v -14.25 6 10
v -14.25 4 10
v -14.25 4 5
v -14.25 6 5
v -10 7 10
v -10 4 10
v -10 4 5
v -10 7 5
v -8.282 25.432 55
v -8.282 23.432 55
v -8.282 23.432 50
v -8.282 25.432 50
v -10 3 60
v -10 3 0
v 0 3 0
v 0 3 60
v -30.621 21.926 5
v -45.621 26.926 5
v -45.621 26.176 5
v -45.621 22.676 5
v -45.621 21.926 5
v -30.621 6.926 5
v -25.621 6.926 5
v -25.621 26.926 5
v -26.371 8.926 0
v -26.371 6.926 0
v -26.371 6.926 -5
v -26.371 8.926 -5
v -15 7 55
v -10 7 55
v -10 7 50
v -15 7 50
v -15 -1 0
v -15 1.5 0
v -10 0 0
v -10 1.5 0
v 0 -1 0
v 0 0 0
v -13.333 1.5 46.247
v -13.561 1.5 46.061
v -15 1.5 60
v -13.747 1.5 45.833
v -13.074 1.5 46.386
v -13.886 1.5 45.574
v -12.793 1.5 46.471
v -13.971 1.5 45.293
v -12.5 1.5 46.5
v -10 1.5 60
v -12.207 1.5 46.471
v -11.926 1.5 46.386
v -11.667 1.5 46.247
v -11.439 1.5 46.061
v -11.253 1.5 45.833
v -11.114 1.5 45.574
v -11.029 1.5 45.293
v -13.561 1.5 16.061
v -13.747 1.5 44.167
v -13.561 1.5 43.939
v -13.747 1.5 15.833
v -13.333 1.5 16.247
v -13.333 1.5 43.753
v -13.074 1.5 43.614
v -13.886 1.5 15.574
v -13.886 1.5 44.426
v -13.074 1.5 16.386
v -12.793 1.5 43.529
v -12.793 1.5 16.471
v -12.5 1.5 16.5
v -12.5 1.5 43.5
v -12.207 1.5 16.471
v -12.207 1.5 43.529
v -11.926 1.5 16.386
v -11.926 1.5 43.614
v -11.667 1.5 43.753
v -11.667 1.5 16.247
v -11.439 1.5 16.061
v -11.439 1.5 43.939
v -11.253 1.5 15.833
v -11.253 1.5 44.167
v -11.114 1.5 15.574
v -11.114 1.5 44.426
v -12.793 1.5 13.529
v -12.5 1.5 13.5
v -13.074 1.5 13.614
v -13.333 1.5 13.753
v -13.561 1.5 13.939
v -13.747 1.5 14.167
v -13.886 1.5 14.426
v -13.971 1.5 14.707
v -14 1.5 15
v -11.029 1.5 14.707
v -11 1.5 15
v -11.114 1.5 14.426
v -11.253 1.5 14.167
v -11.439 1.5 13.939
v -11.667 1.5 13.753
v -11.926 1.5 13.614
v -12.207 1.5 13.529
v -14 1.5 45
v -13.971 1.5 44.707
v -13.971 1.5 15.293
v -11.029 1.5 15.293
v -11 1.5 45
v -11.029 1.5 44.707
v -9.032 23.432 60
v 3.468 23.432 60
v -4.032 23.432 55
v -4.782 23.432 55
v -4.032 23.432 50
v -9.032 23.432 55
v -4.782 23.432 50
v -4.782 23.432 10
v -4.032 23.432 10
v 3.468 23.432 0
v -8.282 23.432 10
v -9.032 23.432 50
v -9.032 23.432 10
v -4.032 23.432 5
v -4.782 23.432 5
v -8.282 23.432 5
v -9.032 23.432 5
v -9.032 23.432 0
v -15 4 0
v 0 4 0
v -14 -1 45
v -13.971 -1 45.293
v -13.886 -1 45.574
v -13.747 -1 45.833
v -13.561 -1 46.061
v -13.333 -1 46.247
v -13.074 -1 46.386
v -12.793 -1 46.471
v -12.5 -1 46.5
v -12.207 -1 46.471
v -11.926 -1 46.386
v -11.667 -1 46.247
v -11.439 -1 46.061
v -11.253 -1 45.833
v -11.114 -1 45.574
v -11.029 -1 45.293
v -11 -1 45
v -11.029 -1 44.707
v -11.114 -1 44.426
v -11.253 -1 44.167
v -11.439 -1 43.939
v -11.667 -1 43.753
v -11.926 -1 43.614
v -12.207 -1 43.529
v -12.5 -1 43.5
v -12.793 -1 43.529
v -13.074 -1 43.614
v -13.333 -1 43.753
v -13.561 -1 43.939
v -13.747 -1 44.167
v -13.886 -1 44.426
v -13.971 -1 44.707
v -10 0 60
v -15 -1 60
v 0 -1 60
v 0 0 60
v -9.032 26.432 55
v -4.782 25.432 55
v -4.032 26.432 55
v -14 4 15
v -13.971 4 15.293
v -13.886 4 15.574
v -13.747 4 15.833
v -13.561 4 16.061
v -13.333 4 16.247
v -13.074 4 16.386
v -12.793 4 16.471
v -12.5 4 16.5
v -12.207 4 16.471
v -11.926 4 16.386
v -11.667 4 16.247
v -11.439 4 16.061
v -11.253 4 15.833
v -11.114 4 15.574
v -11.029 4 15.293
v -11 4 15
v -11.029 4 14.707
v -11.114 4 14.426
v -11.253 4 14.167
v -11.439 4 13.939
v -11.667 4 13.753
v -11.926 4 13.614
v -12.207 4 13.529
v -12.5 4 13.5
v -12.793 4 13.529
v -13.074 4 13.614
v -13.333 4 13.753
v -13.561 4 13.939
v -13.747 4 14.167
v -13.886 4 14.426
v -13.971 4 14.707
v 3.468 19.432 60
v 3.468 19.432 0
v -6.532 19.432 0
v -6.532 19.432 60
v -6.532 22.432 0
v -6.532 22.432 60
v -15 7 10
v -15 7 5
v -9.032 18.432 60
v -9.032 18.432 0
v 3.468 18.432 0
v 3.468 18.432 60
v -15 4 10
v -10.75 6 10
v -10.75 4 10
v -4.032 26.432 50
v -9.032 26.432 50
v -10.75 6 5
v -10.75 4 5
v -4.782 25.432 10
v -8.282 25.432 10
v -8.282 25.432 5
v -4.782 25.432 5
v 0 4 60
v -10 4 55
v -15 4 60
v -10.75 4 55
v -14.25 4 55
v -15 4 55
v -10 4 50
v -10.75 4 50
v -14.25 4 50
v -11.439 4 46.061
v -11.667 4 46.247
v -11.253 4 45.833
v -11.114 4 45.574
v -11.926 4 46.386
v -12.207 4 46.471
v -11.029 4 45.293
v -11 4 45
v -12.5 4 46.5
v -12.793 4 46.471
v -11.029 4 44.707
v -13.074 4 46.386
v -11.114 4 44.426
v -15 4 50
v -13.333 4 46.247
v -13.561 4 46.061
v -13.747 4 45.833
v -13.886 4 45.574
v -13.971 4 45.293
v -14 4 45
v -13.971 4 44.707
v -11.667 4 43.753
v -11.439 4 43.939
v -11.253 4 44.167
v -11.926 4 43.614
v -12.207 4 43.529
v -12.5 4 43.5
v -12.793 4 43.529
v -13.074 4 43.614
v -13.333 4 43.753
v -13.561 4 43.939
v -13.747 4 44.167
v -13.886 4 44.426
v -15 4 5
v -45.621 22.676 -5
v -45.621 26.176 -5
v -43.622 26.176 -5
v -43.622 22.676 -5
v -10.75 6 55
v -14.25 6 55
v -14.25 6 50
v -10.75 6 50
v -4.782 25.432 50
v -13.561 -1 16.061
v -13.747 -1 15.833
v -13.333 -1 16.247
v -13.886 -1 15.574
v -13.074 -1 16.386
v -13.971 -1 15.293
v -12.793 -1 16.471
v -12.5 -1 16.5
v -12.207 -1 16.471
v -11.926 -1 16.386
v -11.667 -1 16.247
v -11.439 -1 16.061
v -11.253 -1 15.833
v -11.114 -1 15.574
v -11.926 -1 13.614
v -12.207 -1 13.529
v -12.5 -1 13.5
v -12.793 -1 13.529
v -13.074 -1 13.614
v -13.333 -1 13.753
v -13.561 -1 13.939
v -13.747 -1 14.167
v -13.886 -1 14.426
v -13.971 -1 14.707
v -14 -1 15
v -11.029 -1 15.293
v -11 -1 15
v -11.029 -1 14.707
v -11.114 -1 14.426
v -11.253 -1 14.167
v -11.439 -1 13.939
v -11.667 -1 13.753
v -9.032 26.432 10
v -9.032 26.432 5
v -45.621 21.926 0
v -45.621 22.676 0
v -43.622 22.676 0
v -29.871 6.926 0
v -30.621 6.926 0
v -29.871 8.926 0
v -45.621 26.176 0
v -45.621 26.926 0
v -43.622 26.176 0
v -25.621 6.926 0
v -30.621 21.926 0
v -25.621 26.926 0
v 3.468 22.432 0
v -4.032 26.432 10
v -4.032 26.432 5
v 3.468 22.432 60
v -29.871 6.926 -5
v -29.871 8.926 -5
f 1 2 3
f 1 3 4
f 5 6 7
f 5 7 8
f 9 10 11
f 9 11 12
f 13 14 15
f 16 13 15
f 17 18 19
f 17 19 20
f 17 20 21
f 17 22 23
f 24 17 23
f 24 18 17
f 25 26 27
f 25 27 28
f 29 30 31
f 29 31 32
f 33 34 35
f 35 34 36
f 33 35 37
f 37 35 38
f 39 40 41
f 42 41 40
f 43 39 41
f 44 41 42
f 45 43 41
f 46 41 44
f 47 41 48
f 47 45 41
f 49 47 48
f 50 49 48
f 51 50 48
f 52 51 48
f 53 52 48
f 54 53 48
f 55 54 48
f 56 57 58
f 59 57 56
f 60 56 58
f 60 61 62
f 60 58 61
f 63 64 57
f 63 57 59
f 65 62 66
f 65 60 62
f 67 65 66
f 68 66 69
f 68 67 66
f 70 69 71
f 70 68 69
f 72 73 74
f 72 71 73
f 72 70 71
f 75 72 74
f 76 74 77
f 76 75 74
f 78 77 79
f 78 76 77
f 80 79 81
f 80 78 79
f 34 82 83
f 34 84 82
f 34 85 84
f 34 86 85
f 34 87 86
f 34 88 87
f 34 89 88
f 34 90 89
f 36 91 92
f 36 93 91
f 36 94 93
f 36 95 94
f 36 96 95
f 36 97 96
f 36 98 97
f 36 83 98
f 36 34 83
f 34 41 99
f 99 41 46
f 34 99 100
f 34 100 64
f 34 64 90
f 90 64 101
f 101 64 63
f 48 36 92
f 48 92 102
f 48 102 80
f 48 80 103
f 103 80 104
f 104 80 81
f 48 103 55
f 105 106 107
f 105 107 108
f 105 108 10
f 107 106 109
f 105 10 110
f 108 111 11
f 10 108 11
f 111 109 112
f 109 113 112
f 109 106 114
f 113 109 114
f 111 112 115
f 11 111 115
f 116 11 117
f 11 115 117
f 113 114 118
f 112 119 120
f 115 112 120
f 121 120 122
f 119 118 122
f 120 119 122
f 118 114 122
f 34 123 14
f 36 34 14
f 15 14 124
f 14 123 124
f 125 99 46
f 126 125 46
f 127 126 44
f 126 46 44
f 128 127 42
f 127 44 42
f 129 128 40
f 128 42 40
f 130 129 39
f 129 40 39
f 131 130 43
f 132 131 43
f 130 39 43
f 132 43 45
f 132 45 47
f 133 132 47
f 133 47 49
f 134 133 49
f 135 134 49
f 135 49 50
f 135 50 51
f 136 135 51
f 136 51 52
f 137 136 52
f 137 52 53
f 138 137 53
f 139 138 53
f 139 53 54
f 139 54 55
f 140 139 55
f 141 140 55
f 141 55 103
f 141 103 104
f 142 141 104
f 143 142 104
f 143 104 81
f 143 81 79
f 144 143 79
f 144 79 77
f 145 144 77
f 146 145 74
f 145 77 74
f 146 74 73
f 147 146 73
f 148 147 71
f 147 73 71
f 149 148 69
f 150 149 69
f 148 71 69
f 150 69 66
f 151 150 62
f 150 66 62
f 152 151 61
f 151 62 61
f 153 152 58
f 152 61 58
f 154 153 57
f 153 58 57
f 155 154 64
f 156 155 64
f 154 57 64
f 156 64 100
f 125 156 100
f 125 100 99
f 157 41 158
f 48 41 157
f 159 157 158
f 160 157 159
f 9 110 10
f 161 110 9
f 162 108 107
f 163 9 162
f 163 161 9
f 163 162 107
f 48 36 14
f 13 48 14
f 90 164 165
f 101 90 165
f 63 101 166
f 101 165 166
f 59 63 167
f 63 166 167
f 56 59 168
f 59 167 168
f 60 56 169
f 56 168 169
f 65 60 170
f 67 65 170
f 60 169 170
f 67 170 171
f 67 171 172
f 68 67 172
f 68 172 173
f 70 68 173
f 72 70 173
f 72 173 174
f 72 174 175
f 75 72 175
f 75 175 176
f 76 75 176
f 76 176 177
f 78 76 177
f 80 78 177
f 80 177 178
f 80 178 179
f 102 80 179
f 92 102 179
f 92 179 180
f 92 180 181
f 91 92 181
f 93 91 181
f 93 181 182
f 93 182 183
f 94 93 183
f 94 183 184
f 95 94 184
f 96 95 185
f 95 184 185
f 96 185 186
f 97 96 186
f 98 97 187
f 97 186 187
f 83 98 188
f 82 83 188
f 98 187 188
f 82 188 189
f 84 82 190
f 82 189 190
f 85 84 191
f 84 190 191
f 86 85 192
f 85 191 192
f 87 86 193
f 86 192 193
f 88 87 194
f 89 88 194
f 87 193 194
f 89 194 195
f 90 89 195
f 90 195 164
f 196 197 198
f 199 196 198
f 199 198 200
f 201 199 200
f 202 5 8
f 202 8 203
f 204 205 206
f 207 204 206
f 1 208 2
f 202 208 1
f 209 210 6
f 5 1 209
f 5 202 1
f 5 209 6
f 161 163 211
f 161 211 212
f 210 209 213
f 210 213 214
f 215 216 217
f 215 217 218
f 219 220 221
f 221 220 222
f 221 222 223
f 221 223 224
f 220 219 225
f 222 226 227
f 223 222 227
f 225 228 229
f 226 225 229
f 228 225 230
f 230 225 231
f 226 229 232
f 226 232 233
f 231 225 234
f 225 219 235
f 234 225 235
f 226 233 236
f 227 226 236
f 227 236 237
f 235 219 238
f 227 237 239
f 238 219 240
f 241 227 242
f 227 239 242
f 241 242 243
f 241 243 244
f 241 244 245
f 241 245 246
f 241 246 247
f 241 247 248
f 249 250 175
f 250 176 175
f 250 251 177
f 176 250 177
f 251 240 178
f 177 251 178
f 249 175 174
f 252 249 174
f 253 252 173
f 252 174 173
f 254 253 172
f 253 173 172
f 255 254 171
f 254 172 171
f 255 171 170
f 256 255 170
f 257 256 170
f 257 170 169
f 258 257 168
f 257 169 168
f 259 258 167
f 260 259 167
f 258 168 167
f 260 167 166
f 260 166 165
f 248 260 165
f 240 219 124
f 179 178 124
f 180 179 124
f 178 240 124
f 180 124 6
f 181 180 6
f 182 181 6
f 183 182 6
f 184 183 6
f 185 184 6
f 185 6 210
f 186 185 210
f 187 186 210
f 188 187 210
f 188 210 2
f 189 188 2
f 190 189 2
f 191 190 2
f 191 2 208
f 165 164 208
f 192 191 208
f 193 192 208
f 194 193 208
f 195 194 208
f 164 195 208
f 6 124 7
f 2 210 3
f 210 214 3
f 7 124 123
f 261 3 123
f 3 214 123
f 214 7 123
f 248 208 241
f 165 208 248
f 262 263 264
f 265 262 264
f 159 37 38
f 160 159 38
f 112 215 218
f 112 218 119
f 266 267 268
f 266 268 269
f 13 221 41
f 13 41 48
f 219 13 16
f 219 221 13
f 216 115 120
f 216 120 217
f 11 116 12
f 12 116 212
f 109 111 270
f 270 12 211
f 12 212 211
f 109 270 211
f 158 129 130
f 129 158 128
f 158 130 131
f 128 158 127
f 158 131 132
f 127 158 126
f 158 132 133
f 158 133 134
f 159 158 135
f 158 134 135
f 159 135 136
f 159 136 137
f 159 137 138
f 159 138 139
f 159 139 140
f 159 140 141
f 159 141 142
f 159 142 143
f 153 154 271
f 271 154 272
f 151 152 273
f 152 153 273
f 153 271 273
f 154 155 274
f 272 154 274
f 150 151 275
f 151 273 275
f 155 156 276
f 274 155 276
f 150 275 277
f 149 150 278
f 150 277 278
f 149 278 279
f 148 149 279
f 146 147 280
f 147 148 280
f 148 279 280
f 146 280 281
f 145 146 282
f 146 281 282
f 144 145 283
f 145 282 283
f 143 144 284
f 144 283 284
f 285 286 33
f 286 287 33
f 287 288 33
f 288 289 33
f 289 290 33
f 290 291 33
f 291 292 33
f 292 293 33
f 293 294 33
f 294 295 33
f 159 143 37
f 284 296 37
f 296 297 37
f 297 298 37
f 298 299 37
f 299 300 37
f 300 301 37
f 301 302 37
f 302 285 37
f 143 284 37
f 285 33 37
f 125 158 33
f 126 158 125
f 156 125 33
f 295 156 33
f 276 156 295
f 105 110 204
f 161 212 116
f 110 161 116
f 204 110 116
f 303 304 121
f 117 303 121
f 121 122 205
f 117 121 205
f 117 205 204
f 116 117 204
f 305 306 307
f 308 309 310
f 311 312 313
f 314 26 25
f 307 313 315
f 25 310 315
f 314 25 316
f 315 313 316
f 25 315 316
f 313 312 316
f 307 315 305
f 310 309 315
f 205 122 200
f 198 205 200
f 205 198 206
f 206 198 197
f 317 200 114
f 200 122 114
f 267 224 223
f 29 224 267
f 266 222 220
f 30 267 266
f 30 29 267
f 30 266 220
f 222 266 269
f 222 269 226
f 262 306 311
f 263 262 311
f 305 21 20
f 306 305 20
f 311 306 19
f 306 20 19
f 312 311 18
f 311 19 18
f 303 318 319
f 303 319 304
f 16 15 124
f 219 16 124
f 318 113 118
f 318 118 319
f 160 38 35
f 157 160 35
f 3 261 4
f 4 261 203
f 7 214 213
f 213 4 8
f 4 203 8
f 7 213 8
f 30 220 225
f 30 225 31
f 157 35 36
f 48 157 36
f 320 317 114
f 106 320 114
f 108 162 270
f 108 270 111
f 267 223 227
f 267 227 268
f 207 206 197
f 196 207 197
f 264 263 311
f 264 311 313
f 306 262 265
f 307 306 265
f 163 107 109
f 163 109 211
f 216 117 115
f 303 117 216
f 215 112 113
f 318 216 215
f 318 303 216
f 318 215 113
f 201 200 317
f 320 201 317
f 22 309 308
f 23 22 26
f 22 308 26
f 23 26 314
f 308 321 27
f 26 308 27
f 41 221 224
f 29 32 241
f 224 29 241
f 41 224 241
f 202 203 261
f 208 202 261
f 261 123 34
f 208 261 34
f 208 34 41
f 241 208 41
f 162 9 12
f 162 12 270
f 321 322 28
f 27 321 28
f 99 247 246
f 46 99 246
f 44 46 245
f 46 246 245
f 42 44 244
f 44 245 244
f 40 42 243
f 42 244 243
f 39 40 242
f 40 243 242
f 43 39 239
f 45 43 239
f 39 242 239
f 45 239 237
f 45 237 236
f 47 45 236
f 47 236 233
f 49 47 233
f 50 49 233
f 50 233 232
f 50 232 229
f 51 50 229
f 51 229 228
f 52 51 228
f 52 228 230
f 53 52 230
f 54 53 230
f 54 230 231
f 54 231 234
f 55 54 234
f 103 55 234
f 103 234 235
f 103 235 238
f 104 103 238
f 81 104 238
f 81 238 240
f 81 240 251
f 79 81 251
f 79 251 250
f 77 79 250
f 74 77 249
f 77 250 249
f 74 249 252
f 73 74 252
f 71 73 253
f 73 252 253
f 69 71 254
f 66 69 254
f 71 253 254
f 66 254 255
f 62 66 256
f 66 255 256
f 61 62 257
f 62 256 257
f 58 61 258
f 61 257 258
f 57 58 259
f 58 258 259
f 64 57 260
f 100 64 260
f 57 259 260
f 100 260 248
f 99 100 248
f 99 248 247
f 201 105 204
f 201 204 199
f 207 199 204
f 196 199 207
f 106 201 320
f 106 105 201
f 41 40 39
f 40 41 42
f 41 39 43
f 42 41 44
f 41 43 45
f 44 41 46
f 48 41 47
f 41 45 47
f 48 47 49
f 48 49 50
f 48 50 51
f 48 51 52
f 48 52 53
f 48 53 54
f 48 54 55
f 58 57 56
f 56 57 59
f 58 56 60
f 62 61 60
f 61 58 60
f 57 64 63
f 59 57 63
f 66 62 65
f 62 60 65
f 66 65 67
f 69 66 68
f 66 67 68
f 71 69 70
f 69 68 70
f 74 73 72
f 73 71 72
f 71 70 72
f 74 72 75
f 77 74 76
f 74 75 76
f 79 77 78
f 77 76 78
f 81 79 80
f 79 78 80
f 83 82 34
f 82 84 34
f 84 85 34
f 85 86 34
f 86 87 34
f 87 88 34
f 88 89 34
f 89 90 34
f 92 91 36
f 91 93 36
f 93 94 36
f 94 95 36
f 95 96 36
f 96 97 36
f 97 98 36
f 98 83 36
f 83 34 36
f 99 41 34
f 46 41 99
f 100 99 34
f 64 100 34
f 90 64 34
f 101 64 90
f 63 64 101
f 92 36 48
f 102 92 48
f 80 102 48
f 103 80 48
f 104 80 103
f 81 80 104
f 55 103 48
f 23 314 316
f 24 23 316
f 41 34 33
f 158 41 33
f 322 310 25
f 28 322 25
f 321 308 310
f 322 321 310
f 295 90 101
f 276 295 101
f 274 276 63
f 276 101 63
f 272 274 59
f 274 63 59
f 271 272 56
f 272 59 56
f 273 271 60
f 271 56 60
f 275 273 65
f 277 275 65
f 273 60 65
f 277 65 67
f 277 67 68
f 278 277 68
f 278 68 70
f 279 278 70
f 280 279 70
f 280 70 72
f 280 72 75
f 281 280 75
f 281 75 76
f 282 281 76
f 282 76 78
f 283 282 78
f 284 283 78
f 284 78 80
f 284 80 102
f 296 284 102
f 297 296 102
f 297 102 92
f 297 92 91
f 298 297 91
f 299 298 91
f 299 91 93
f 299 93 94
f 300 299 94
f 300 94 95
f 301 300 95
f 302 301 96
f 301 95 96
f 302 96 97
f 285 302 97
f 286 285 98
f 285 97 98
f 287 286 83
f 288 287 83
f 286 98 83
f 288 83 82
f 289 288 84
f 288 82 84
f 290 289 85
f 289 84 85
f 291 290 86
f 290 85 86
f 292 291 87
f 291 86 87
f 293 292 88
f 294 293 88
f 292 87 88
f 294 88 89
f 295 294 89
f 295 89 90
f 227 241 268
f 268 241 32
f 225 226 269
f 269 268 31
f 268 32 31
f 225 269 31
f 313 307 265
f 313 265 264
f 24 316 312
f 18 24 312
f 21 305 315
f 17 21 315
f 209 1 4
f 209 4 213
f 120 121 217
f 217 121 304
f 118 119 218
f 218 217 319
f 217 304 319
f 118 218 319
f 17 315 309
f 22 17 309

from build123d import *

# Parameters (mm, degrees)
F0_W       = 5
F0_H       = 1.5
F1_DEPTH   = 60
F2_DEPTH   = 60
F4_D       = 3
F4_DEPTH   = 100
F4_TIP     = 0.9012909285
F4_2_D     = 3
F4_2_DEPTH = 100
F4_2_TIP   = 0.9012909285
F6_DEPTH   = 60
F8_START   = -5
F8_DEPTH   = 5
F9_START   = -50
F9_DEPTH   = 5
F11_START  = -5
F11_DEPTH  = 5
F12_START  = -50
F12_DEPTH  = 5
F13_W      = 5
F13_H      = 5
F13_W_2    = 12
F13_H_2    = 12
F13_W_3    = 1.9991025329
F13_H_3    = 3.5
F13_W_4    = 3.5
F13_H_4    = 2
F14_DEPTH  = 5
F15_DEPTH  = 5


with BuildPart() as f1:
    # F0 (on Top) → F1 (new body)
    with BuildSketch(Plane.XY):
        Polygon((-10, 3), (0, 3), (0, 4), (-15, 4), (-15, 3), align=None)
        with Locations((-12.5, 2.25)):
            Rectangle(F0_W, F0_H)
    extrude(amount=F1_DEPTH)

    # F4
    with Locations(Plane.XZ.offset(1)):
        with Locations((-12.5, 45), (-12.5, 15)):
            Hole(F4_D / 2, depth=F4_DEPTH)
            with Locations((0, 0, -(F4_DEPTH + F4_TIP / 2))):  # 118° drill point
                Cone(0, F4_D / 2, F4_TIP, mode=Mode.SUBTRACT)

    # F7 (on face) → F8 (join)
    with BuildSketch(Plane.XY.offset(60).offset(F8_START)):
        Polygon((-15, 7), (-15, 4), (-14.25, 4), (-14.25, 6), (-10.75, 6), (-10.75, 4), (-10, 4), (-10, 7), align=None)
    extrude(amount=-F8_DEPTH)

    # F7 (on face) → F9 (join)
    with BuildSketch(Plane.XY.offset(60).offset(F9_START)):
        Polygon((-15, 7), (-15, 4), (-14.25, 4), (-14.25, 6), (-10.75, 6), (-10.75, 4), (-10, 4), (-10, 7), align=None)
    extrude(amount=-F9_DEPTH)


with BuildPart() as f2:
    # F0 (on Top) → F2 (new body)
    with BuildSketch(Plane.XY):
        with Locations((-12.5, 0.75)):
            Rectangle(F0_W, F0_H)
        Polygon((0, -1), (0, 0), (-10, 0), (-15, 0), (-15, -1), align=None)
    extrude(amount=F2_DEPTH)

    # F4#2
    with Locations(Plane.XZ.offset(1)):
        with Locations((-12.5, 45), (-12.5, 15)):
            Hole(F4_2_D / 2, depth=F4_2_DEPTH)
            with Locations((0, 0, -(F4_2_DEPTH + F4_2_TIP / 2))):  # 118° drill point
                Cone(0, F4_2_D / 2, F4_2_TIP, mode=Mode.SUBTRACT)


with BuildPart() as f6:
    # F5 (on Top) → F6 (new body)
    with BuildSketch(Plane.XY):
        Polygon((-6.5322569013, 22.4318350405), (3.4677430987, 22.4318350405), (3.4677430987, 23.4318350405), (-9.0322569013, 23.4318350405), (-9.0322569013, 20.9318350405), (-6.5322569013, 20.9318350405), align=None)
        Polygon((-6.5322569013, 19.4318350405), (-6.5322569013, 20.9318350405), (-9.0322569013, 20.9318350405), (-9.0322569013, 18.4318350405), (3.4677430987, 18.4318350405), (3.4677430987, 19.4318350405), align=None)
    extrude(amount=F6_DEPTH)

    # F10 (on face) → F11 (join)
    with BuildSketch(Plane.XY.offset(60).offset(F11_START)):
        Polygon((-9.0322569013, 26.4318350405), (-9.0322569013, 23.4318350405), (-8.2822569013, 23.4318350405), (-8.2822569013, 25.4318350405), (-4.7822569013, 25.4318350405), (-4.7822569013, 23.4318350405), (-4.0322569013, 23.4318350405), (-4.0322569013, 26.4318350405), align=None)
    extrude(amount=-F11_DEPTH)

    # F10 (on face) → F12 (join)
    with BuildSketch(Plane.XY.offset(60).offset(F12_START)):
        Polygon((-9.0322569013, 26.4318350405), (-9.0322569013, 23.4318350405), (-8.2822569013, 23.4318350405), (-8.2822569013, 25.4318350405), (-4.7822569013, 25.4318350405), (-4.7822569013, 23.4318350405), (-4.0322569013, 23.4318350405), (-4.0322569013, 26.4318350405), align=None)
    extrude(amount=-F12_DEPTH)


with BuildPart() as f14:
    # F13 (on Top) → F14 (new body)
    with BuildSketch(Plane.XY):
        with Locations((-28.121458441, 24.4260315597)):
            Rectangle(F13_W, F13_H)
        with Locations((-36.621458441, 24.4260315597)):
            Rectangle(F13_W_2, F13_H)
        with Locations((-28.121458441, 15.9260315597)):
            Rectangle(F13_W, F13_H_2)
        Polygon((-42.621458441, 21.9260315597), (-42.621458441, 26.9260315597), (-45.621458441, 26.9260315597), (-45.621458441, 26.1760315597), (-43.6223559082, 26.1760315597), (-43.6223559082, 22.6760315597), (-45.621458441, 22.6760315597), (-45.621458441, 21.9260315597), align=None)
        Polygon((-25.621458441, 9.9260315597), (-30.621458441, 9.9260315597), (-30.621458441, 6.9260315597), (-29.871458441, 6.9260315597), (-29.871458441, 8.9260315597), (-26.371458441, 8.9260315597), (-26.371458441, 6.9260315597), (-25.621458441, 6.9260315597), align=None)
        with Locations((-44.6219071746, 24.4260315597)):
            Rectangle(F13_W_3, F13_H_3)
        with Locations((-28.121458441, 7.9260315597)):
            Rectangle(F13_W_4, F13_H_4)
    extrude(amount=F14_DEPTH)

    # F13 (on Top) → F15 (join)
    with BuildSketch(Plane.XY):
        with Locations((-28.121458441, 7.9260315597)):
            Rectangle(F13_W_4, F13_H_4)
        with Locations((-44.6219071746, 24.4260315597)):
            Rectangle(F13_W_3, F13_H_3)
    extrude(amount=-F15_DEPTH)


solid = Compound([f1.part, f2.part, f6.part, f14.part])
